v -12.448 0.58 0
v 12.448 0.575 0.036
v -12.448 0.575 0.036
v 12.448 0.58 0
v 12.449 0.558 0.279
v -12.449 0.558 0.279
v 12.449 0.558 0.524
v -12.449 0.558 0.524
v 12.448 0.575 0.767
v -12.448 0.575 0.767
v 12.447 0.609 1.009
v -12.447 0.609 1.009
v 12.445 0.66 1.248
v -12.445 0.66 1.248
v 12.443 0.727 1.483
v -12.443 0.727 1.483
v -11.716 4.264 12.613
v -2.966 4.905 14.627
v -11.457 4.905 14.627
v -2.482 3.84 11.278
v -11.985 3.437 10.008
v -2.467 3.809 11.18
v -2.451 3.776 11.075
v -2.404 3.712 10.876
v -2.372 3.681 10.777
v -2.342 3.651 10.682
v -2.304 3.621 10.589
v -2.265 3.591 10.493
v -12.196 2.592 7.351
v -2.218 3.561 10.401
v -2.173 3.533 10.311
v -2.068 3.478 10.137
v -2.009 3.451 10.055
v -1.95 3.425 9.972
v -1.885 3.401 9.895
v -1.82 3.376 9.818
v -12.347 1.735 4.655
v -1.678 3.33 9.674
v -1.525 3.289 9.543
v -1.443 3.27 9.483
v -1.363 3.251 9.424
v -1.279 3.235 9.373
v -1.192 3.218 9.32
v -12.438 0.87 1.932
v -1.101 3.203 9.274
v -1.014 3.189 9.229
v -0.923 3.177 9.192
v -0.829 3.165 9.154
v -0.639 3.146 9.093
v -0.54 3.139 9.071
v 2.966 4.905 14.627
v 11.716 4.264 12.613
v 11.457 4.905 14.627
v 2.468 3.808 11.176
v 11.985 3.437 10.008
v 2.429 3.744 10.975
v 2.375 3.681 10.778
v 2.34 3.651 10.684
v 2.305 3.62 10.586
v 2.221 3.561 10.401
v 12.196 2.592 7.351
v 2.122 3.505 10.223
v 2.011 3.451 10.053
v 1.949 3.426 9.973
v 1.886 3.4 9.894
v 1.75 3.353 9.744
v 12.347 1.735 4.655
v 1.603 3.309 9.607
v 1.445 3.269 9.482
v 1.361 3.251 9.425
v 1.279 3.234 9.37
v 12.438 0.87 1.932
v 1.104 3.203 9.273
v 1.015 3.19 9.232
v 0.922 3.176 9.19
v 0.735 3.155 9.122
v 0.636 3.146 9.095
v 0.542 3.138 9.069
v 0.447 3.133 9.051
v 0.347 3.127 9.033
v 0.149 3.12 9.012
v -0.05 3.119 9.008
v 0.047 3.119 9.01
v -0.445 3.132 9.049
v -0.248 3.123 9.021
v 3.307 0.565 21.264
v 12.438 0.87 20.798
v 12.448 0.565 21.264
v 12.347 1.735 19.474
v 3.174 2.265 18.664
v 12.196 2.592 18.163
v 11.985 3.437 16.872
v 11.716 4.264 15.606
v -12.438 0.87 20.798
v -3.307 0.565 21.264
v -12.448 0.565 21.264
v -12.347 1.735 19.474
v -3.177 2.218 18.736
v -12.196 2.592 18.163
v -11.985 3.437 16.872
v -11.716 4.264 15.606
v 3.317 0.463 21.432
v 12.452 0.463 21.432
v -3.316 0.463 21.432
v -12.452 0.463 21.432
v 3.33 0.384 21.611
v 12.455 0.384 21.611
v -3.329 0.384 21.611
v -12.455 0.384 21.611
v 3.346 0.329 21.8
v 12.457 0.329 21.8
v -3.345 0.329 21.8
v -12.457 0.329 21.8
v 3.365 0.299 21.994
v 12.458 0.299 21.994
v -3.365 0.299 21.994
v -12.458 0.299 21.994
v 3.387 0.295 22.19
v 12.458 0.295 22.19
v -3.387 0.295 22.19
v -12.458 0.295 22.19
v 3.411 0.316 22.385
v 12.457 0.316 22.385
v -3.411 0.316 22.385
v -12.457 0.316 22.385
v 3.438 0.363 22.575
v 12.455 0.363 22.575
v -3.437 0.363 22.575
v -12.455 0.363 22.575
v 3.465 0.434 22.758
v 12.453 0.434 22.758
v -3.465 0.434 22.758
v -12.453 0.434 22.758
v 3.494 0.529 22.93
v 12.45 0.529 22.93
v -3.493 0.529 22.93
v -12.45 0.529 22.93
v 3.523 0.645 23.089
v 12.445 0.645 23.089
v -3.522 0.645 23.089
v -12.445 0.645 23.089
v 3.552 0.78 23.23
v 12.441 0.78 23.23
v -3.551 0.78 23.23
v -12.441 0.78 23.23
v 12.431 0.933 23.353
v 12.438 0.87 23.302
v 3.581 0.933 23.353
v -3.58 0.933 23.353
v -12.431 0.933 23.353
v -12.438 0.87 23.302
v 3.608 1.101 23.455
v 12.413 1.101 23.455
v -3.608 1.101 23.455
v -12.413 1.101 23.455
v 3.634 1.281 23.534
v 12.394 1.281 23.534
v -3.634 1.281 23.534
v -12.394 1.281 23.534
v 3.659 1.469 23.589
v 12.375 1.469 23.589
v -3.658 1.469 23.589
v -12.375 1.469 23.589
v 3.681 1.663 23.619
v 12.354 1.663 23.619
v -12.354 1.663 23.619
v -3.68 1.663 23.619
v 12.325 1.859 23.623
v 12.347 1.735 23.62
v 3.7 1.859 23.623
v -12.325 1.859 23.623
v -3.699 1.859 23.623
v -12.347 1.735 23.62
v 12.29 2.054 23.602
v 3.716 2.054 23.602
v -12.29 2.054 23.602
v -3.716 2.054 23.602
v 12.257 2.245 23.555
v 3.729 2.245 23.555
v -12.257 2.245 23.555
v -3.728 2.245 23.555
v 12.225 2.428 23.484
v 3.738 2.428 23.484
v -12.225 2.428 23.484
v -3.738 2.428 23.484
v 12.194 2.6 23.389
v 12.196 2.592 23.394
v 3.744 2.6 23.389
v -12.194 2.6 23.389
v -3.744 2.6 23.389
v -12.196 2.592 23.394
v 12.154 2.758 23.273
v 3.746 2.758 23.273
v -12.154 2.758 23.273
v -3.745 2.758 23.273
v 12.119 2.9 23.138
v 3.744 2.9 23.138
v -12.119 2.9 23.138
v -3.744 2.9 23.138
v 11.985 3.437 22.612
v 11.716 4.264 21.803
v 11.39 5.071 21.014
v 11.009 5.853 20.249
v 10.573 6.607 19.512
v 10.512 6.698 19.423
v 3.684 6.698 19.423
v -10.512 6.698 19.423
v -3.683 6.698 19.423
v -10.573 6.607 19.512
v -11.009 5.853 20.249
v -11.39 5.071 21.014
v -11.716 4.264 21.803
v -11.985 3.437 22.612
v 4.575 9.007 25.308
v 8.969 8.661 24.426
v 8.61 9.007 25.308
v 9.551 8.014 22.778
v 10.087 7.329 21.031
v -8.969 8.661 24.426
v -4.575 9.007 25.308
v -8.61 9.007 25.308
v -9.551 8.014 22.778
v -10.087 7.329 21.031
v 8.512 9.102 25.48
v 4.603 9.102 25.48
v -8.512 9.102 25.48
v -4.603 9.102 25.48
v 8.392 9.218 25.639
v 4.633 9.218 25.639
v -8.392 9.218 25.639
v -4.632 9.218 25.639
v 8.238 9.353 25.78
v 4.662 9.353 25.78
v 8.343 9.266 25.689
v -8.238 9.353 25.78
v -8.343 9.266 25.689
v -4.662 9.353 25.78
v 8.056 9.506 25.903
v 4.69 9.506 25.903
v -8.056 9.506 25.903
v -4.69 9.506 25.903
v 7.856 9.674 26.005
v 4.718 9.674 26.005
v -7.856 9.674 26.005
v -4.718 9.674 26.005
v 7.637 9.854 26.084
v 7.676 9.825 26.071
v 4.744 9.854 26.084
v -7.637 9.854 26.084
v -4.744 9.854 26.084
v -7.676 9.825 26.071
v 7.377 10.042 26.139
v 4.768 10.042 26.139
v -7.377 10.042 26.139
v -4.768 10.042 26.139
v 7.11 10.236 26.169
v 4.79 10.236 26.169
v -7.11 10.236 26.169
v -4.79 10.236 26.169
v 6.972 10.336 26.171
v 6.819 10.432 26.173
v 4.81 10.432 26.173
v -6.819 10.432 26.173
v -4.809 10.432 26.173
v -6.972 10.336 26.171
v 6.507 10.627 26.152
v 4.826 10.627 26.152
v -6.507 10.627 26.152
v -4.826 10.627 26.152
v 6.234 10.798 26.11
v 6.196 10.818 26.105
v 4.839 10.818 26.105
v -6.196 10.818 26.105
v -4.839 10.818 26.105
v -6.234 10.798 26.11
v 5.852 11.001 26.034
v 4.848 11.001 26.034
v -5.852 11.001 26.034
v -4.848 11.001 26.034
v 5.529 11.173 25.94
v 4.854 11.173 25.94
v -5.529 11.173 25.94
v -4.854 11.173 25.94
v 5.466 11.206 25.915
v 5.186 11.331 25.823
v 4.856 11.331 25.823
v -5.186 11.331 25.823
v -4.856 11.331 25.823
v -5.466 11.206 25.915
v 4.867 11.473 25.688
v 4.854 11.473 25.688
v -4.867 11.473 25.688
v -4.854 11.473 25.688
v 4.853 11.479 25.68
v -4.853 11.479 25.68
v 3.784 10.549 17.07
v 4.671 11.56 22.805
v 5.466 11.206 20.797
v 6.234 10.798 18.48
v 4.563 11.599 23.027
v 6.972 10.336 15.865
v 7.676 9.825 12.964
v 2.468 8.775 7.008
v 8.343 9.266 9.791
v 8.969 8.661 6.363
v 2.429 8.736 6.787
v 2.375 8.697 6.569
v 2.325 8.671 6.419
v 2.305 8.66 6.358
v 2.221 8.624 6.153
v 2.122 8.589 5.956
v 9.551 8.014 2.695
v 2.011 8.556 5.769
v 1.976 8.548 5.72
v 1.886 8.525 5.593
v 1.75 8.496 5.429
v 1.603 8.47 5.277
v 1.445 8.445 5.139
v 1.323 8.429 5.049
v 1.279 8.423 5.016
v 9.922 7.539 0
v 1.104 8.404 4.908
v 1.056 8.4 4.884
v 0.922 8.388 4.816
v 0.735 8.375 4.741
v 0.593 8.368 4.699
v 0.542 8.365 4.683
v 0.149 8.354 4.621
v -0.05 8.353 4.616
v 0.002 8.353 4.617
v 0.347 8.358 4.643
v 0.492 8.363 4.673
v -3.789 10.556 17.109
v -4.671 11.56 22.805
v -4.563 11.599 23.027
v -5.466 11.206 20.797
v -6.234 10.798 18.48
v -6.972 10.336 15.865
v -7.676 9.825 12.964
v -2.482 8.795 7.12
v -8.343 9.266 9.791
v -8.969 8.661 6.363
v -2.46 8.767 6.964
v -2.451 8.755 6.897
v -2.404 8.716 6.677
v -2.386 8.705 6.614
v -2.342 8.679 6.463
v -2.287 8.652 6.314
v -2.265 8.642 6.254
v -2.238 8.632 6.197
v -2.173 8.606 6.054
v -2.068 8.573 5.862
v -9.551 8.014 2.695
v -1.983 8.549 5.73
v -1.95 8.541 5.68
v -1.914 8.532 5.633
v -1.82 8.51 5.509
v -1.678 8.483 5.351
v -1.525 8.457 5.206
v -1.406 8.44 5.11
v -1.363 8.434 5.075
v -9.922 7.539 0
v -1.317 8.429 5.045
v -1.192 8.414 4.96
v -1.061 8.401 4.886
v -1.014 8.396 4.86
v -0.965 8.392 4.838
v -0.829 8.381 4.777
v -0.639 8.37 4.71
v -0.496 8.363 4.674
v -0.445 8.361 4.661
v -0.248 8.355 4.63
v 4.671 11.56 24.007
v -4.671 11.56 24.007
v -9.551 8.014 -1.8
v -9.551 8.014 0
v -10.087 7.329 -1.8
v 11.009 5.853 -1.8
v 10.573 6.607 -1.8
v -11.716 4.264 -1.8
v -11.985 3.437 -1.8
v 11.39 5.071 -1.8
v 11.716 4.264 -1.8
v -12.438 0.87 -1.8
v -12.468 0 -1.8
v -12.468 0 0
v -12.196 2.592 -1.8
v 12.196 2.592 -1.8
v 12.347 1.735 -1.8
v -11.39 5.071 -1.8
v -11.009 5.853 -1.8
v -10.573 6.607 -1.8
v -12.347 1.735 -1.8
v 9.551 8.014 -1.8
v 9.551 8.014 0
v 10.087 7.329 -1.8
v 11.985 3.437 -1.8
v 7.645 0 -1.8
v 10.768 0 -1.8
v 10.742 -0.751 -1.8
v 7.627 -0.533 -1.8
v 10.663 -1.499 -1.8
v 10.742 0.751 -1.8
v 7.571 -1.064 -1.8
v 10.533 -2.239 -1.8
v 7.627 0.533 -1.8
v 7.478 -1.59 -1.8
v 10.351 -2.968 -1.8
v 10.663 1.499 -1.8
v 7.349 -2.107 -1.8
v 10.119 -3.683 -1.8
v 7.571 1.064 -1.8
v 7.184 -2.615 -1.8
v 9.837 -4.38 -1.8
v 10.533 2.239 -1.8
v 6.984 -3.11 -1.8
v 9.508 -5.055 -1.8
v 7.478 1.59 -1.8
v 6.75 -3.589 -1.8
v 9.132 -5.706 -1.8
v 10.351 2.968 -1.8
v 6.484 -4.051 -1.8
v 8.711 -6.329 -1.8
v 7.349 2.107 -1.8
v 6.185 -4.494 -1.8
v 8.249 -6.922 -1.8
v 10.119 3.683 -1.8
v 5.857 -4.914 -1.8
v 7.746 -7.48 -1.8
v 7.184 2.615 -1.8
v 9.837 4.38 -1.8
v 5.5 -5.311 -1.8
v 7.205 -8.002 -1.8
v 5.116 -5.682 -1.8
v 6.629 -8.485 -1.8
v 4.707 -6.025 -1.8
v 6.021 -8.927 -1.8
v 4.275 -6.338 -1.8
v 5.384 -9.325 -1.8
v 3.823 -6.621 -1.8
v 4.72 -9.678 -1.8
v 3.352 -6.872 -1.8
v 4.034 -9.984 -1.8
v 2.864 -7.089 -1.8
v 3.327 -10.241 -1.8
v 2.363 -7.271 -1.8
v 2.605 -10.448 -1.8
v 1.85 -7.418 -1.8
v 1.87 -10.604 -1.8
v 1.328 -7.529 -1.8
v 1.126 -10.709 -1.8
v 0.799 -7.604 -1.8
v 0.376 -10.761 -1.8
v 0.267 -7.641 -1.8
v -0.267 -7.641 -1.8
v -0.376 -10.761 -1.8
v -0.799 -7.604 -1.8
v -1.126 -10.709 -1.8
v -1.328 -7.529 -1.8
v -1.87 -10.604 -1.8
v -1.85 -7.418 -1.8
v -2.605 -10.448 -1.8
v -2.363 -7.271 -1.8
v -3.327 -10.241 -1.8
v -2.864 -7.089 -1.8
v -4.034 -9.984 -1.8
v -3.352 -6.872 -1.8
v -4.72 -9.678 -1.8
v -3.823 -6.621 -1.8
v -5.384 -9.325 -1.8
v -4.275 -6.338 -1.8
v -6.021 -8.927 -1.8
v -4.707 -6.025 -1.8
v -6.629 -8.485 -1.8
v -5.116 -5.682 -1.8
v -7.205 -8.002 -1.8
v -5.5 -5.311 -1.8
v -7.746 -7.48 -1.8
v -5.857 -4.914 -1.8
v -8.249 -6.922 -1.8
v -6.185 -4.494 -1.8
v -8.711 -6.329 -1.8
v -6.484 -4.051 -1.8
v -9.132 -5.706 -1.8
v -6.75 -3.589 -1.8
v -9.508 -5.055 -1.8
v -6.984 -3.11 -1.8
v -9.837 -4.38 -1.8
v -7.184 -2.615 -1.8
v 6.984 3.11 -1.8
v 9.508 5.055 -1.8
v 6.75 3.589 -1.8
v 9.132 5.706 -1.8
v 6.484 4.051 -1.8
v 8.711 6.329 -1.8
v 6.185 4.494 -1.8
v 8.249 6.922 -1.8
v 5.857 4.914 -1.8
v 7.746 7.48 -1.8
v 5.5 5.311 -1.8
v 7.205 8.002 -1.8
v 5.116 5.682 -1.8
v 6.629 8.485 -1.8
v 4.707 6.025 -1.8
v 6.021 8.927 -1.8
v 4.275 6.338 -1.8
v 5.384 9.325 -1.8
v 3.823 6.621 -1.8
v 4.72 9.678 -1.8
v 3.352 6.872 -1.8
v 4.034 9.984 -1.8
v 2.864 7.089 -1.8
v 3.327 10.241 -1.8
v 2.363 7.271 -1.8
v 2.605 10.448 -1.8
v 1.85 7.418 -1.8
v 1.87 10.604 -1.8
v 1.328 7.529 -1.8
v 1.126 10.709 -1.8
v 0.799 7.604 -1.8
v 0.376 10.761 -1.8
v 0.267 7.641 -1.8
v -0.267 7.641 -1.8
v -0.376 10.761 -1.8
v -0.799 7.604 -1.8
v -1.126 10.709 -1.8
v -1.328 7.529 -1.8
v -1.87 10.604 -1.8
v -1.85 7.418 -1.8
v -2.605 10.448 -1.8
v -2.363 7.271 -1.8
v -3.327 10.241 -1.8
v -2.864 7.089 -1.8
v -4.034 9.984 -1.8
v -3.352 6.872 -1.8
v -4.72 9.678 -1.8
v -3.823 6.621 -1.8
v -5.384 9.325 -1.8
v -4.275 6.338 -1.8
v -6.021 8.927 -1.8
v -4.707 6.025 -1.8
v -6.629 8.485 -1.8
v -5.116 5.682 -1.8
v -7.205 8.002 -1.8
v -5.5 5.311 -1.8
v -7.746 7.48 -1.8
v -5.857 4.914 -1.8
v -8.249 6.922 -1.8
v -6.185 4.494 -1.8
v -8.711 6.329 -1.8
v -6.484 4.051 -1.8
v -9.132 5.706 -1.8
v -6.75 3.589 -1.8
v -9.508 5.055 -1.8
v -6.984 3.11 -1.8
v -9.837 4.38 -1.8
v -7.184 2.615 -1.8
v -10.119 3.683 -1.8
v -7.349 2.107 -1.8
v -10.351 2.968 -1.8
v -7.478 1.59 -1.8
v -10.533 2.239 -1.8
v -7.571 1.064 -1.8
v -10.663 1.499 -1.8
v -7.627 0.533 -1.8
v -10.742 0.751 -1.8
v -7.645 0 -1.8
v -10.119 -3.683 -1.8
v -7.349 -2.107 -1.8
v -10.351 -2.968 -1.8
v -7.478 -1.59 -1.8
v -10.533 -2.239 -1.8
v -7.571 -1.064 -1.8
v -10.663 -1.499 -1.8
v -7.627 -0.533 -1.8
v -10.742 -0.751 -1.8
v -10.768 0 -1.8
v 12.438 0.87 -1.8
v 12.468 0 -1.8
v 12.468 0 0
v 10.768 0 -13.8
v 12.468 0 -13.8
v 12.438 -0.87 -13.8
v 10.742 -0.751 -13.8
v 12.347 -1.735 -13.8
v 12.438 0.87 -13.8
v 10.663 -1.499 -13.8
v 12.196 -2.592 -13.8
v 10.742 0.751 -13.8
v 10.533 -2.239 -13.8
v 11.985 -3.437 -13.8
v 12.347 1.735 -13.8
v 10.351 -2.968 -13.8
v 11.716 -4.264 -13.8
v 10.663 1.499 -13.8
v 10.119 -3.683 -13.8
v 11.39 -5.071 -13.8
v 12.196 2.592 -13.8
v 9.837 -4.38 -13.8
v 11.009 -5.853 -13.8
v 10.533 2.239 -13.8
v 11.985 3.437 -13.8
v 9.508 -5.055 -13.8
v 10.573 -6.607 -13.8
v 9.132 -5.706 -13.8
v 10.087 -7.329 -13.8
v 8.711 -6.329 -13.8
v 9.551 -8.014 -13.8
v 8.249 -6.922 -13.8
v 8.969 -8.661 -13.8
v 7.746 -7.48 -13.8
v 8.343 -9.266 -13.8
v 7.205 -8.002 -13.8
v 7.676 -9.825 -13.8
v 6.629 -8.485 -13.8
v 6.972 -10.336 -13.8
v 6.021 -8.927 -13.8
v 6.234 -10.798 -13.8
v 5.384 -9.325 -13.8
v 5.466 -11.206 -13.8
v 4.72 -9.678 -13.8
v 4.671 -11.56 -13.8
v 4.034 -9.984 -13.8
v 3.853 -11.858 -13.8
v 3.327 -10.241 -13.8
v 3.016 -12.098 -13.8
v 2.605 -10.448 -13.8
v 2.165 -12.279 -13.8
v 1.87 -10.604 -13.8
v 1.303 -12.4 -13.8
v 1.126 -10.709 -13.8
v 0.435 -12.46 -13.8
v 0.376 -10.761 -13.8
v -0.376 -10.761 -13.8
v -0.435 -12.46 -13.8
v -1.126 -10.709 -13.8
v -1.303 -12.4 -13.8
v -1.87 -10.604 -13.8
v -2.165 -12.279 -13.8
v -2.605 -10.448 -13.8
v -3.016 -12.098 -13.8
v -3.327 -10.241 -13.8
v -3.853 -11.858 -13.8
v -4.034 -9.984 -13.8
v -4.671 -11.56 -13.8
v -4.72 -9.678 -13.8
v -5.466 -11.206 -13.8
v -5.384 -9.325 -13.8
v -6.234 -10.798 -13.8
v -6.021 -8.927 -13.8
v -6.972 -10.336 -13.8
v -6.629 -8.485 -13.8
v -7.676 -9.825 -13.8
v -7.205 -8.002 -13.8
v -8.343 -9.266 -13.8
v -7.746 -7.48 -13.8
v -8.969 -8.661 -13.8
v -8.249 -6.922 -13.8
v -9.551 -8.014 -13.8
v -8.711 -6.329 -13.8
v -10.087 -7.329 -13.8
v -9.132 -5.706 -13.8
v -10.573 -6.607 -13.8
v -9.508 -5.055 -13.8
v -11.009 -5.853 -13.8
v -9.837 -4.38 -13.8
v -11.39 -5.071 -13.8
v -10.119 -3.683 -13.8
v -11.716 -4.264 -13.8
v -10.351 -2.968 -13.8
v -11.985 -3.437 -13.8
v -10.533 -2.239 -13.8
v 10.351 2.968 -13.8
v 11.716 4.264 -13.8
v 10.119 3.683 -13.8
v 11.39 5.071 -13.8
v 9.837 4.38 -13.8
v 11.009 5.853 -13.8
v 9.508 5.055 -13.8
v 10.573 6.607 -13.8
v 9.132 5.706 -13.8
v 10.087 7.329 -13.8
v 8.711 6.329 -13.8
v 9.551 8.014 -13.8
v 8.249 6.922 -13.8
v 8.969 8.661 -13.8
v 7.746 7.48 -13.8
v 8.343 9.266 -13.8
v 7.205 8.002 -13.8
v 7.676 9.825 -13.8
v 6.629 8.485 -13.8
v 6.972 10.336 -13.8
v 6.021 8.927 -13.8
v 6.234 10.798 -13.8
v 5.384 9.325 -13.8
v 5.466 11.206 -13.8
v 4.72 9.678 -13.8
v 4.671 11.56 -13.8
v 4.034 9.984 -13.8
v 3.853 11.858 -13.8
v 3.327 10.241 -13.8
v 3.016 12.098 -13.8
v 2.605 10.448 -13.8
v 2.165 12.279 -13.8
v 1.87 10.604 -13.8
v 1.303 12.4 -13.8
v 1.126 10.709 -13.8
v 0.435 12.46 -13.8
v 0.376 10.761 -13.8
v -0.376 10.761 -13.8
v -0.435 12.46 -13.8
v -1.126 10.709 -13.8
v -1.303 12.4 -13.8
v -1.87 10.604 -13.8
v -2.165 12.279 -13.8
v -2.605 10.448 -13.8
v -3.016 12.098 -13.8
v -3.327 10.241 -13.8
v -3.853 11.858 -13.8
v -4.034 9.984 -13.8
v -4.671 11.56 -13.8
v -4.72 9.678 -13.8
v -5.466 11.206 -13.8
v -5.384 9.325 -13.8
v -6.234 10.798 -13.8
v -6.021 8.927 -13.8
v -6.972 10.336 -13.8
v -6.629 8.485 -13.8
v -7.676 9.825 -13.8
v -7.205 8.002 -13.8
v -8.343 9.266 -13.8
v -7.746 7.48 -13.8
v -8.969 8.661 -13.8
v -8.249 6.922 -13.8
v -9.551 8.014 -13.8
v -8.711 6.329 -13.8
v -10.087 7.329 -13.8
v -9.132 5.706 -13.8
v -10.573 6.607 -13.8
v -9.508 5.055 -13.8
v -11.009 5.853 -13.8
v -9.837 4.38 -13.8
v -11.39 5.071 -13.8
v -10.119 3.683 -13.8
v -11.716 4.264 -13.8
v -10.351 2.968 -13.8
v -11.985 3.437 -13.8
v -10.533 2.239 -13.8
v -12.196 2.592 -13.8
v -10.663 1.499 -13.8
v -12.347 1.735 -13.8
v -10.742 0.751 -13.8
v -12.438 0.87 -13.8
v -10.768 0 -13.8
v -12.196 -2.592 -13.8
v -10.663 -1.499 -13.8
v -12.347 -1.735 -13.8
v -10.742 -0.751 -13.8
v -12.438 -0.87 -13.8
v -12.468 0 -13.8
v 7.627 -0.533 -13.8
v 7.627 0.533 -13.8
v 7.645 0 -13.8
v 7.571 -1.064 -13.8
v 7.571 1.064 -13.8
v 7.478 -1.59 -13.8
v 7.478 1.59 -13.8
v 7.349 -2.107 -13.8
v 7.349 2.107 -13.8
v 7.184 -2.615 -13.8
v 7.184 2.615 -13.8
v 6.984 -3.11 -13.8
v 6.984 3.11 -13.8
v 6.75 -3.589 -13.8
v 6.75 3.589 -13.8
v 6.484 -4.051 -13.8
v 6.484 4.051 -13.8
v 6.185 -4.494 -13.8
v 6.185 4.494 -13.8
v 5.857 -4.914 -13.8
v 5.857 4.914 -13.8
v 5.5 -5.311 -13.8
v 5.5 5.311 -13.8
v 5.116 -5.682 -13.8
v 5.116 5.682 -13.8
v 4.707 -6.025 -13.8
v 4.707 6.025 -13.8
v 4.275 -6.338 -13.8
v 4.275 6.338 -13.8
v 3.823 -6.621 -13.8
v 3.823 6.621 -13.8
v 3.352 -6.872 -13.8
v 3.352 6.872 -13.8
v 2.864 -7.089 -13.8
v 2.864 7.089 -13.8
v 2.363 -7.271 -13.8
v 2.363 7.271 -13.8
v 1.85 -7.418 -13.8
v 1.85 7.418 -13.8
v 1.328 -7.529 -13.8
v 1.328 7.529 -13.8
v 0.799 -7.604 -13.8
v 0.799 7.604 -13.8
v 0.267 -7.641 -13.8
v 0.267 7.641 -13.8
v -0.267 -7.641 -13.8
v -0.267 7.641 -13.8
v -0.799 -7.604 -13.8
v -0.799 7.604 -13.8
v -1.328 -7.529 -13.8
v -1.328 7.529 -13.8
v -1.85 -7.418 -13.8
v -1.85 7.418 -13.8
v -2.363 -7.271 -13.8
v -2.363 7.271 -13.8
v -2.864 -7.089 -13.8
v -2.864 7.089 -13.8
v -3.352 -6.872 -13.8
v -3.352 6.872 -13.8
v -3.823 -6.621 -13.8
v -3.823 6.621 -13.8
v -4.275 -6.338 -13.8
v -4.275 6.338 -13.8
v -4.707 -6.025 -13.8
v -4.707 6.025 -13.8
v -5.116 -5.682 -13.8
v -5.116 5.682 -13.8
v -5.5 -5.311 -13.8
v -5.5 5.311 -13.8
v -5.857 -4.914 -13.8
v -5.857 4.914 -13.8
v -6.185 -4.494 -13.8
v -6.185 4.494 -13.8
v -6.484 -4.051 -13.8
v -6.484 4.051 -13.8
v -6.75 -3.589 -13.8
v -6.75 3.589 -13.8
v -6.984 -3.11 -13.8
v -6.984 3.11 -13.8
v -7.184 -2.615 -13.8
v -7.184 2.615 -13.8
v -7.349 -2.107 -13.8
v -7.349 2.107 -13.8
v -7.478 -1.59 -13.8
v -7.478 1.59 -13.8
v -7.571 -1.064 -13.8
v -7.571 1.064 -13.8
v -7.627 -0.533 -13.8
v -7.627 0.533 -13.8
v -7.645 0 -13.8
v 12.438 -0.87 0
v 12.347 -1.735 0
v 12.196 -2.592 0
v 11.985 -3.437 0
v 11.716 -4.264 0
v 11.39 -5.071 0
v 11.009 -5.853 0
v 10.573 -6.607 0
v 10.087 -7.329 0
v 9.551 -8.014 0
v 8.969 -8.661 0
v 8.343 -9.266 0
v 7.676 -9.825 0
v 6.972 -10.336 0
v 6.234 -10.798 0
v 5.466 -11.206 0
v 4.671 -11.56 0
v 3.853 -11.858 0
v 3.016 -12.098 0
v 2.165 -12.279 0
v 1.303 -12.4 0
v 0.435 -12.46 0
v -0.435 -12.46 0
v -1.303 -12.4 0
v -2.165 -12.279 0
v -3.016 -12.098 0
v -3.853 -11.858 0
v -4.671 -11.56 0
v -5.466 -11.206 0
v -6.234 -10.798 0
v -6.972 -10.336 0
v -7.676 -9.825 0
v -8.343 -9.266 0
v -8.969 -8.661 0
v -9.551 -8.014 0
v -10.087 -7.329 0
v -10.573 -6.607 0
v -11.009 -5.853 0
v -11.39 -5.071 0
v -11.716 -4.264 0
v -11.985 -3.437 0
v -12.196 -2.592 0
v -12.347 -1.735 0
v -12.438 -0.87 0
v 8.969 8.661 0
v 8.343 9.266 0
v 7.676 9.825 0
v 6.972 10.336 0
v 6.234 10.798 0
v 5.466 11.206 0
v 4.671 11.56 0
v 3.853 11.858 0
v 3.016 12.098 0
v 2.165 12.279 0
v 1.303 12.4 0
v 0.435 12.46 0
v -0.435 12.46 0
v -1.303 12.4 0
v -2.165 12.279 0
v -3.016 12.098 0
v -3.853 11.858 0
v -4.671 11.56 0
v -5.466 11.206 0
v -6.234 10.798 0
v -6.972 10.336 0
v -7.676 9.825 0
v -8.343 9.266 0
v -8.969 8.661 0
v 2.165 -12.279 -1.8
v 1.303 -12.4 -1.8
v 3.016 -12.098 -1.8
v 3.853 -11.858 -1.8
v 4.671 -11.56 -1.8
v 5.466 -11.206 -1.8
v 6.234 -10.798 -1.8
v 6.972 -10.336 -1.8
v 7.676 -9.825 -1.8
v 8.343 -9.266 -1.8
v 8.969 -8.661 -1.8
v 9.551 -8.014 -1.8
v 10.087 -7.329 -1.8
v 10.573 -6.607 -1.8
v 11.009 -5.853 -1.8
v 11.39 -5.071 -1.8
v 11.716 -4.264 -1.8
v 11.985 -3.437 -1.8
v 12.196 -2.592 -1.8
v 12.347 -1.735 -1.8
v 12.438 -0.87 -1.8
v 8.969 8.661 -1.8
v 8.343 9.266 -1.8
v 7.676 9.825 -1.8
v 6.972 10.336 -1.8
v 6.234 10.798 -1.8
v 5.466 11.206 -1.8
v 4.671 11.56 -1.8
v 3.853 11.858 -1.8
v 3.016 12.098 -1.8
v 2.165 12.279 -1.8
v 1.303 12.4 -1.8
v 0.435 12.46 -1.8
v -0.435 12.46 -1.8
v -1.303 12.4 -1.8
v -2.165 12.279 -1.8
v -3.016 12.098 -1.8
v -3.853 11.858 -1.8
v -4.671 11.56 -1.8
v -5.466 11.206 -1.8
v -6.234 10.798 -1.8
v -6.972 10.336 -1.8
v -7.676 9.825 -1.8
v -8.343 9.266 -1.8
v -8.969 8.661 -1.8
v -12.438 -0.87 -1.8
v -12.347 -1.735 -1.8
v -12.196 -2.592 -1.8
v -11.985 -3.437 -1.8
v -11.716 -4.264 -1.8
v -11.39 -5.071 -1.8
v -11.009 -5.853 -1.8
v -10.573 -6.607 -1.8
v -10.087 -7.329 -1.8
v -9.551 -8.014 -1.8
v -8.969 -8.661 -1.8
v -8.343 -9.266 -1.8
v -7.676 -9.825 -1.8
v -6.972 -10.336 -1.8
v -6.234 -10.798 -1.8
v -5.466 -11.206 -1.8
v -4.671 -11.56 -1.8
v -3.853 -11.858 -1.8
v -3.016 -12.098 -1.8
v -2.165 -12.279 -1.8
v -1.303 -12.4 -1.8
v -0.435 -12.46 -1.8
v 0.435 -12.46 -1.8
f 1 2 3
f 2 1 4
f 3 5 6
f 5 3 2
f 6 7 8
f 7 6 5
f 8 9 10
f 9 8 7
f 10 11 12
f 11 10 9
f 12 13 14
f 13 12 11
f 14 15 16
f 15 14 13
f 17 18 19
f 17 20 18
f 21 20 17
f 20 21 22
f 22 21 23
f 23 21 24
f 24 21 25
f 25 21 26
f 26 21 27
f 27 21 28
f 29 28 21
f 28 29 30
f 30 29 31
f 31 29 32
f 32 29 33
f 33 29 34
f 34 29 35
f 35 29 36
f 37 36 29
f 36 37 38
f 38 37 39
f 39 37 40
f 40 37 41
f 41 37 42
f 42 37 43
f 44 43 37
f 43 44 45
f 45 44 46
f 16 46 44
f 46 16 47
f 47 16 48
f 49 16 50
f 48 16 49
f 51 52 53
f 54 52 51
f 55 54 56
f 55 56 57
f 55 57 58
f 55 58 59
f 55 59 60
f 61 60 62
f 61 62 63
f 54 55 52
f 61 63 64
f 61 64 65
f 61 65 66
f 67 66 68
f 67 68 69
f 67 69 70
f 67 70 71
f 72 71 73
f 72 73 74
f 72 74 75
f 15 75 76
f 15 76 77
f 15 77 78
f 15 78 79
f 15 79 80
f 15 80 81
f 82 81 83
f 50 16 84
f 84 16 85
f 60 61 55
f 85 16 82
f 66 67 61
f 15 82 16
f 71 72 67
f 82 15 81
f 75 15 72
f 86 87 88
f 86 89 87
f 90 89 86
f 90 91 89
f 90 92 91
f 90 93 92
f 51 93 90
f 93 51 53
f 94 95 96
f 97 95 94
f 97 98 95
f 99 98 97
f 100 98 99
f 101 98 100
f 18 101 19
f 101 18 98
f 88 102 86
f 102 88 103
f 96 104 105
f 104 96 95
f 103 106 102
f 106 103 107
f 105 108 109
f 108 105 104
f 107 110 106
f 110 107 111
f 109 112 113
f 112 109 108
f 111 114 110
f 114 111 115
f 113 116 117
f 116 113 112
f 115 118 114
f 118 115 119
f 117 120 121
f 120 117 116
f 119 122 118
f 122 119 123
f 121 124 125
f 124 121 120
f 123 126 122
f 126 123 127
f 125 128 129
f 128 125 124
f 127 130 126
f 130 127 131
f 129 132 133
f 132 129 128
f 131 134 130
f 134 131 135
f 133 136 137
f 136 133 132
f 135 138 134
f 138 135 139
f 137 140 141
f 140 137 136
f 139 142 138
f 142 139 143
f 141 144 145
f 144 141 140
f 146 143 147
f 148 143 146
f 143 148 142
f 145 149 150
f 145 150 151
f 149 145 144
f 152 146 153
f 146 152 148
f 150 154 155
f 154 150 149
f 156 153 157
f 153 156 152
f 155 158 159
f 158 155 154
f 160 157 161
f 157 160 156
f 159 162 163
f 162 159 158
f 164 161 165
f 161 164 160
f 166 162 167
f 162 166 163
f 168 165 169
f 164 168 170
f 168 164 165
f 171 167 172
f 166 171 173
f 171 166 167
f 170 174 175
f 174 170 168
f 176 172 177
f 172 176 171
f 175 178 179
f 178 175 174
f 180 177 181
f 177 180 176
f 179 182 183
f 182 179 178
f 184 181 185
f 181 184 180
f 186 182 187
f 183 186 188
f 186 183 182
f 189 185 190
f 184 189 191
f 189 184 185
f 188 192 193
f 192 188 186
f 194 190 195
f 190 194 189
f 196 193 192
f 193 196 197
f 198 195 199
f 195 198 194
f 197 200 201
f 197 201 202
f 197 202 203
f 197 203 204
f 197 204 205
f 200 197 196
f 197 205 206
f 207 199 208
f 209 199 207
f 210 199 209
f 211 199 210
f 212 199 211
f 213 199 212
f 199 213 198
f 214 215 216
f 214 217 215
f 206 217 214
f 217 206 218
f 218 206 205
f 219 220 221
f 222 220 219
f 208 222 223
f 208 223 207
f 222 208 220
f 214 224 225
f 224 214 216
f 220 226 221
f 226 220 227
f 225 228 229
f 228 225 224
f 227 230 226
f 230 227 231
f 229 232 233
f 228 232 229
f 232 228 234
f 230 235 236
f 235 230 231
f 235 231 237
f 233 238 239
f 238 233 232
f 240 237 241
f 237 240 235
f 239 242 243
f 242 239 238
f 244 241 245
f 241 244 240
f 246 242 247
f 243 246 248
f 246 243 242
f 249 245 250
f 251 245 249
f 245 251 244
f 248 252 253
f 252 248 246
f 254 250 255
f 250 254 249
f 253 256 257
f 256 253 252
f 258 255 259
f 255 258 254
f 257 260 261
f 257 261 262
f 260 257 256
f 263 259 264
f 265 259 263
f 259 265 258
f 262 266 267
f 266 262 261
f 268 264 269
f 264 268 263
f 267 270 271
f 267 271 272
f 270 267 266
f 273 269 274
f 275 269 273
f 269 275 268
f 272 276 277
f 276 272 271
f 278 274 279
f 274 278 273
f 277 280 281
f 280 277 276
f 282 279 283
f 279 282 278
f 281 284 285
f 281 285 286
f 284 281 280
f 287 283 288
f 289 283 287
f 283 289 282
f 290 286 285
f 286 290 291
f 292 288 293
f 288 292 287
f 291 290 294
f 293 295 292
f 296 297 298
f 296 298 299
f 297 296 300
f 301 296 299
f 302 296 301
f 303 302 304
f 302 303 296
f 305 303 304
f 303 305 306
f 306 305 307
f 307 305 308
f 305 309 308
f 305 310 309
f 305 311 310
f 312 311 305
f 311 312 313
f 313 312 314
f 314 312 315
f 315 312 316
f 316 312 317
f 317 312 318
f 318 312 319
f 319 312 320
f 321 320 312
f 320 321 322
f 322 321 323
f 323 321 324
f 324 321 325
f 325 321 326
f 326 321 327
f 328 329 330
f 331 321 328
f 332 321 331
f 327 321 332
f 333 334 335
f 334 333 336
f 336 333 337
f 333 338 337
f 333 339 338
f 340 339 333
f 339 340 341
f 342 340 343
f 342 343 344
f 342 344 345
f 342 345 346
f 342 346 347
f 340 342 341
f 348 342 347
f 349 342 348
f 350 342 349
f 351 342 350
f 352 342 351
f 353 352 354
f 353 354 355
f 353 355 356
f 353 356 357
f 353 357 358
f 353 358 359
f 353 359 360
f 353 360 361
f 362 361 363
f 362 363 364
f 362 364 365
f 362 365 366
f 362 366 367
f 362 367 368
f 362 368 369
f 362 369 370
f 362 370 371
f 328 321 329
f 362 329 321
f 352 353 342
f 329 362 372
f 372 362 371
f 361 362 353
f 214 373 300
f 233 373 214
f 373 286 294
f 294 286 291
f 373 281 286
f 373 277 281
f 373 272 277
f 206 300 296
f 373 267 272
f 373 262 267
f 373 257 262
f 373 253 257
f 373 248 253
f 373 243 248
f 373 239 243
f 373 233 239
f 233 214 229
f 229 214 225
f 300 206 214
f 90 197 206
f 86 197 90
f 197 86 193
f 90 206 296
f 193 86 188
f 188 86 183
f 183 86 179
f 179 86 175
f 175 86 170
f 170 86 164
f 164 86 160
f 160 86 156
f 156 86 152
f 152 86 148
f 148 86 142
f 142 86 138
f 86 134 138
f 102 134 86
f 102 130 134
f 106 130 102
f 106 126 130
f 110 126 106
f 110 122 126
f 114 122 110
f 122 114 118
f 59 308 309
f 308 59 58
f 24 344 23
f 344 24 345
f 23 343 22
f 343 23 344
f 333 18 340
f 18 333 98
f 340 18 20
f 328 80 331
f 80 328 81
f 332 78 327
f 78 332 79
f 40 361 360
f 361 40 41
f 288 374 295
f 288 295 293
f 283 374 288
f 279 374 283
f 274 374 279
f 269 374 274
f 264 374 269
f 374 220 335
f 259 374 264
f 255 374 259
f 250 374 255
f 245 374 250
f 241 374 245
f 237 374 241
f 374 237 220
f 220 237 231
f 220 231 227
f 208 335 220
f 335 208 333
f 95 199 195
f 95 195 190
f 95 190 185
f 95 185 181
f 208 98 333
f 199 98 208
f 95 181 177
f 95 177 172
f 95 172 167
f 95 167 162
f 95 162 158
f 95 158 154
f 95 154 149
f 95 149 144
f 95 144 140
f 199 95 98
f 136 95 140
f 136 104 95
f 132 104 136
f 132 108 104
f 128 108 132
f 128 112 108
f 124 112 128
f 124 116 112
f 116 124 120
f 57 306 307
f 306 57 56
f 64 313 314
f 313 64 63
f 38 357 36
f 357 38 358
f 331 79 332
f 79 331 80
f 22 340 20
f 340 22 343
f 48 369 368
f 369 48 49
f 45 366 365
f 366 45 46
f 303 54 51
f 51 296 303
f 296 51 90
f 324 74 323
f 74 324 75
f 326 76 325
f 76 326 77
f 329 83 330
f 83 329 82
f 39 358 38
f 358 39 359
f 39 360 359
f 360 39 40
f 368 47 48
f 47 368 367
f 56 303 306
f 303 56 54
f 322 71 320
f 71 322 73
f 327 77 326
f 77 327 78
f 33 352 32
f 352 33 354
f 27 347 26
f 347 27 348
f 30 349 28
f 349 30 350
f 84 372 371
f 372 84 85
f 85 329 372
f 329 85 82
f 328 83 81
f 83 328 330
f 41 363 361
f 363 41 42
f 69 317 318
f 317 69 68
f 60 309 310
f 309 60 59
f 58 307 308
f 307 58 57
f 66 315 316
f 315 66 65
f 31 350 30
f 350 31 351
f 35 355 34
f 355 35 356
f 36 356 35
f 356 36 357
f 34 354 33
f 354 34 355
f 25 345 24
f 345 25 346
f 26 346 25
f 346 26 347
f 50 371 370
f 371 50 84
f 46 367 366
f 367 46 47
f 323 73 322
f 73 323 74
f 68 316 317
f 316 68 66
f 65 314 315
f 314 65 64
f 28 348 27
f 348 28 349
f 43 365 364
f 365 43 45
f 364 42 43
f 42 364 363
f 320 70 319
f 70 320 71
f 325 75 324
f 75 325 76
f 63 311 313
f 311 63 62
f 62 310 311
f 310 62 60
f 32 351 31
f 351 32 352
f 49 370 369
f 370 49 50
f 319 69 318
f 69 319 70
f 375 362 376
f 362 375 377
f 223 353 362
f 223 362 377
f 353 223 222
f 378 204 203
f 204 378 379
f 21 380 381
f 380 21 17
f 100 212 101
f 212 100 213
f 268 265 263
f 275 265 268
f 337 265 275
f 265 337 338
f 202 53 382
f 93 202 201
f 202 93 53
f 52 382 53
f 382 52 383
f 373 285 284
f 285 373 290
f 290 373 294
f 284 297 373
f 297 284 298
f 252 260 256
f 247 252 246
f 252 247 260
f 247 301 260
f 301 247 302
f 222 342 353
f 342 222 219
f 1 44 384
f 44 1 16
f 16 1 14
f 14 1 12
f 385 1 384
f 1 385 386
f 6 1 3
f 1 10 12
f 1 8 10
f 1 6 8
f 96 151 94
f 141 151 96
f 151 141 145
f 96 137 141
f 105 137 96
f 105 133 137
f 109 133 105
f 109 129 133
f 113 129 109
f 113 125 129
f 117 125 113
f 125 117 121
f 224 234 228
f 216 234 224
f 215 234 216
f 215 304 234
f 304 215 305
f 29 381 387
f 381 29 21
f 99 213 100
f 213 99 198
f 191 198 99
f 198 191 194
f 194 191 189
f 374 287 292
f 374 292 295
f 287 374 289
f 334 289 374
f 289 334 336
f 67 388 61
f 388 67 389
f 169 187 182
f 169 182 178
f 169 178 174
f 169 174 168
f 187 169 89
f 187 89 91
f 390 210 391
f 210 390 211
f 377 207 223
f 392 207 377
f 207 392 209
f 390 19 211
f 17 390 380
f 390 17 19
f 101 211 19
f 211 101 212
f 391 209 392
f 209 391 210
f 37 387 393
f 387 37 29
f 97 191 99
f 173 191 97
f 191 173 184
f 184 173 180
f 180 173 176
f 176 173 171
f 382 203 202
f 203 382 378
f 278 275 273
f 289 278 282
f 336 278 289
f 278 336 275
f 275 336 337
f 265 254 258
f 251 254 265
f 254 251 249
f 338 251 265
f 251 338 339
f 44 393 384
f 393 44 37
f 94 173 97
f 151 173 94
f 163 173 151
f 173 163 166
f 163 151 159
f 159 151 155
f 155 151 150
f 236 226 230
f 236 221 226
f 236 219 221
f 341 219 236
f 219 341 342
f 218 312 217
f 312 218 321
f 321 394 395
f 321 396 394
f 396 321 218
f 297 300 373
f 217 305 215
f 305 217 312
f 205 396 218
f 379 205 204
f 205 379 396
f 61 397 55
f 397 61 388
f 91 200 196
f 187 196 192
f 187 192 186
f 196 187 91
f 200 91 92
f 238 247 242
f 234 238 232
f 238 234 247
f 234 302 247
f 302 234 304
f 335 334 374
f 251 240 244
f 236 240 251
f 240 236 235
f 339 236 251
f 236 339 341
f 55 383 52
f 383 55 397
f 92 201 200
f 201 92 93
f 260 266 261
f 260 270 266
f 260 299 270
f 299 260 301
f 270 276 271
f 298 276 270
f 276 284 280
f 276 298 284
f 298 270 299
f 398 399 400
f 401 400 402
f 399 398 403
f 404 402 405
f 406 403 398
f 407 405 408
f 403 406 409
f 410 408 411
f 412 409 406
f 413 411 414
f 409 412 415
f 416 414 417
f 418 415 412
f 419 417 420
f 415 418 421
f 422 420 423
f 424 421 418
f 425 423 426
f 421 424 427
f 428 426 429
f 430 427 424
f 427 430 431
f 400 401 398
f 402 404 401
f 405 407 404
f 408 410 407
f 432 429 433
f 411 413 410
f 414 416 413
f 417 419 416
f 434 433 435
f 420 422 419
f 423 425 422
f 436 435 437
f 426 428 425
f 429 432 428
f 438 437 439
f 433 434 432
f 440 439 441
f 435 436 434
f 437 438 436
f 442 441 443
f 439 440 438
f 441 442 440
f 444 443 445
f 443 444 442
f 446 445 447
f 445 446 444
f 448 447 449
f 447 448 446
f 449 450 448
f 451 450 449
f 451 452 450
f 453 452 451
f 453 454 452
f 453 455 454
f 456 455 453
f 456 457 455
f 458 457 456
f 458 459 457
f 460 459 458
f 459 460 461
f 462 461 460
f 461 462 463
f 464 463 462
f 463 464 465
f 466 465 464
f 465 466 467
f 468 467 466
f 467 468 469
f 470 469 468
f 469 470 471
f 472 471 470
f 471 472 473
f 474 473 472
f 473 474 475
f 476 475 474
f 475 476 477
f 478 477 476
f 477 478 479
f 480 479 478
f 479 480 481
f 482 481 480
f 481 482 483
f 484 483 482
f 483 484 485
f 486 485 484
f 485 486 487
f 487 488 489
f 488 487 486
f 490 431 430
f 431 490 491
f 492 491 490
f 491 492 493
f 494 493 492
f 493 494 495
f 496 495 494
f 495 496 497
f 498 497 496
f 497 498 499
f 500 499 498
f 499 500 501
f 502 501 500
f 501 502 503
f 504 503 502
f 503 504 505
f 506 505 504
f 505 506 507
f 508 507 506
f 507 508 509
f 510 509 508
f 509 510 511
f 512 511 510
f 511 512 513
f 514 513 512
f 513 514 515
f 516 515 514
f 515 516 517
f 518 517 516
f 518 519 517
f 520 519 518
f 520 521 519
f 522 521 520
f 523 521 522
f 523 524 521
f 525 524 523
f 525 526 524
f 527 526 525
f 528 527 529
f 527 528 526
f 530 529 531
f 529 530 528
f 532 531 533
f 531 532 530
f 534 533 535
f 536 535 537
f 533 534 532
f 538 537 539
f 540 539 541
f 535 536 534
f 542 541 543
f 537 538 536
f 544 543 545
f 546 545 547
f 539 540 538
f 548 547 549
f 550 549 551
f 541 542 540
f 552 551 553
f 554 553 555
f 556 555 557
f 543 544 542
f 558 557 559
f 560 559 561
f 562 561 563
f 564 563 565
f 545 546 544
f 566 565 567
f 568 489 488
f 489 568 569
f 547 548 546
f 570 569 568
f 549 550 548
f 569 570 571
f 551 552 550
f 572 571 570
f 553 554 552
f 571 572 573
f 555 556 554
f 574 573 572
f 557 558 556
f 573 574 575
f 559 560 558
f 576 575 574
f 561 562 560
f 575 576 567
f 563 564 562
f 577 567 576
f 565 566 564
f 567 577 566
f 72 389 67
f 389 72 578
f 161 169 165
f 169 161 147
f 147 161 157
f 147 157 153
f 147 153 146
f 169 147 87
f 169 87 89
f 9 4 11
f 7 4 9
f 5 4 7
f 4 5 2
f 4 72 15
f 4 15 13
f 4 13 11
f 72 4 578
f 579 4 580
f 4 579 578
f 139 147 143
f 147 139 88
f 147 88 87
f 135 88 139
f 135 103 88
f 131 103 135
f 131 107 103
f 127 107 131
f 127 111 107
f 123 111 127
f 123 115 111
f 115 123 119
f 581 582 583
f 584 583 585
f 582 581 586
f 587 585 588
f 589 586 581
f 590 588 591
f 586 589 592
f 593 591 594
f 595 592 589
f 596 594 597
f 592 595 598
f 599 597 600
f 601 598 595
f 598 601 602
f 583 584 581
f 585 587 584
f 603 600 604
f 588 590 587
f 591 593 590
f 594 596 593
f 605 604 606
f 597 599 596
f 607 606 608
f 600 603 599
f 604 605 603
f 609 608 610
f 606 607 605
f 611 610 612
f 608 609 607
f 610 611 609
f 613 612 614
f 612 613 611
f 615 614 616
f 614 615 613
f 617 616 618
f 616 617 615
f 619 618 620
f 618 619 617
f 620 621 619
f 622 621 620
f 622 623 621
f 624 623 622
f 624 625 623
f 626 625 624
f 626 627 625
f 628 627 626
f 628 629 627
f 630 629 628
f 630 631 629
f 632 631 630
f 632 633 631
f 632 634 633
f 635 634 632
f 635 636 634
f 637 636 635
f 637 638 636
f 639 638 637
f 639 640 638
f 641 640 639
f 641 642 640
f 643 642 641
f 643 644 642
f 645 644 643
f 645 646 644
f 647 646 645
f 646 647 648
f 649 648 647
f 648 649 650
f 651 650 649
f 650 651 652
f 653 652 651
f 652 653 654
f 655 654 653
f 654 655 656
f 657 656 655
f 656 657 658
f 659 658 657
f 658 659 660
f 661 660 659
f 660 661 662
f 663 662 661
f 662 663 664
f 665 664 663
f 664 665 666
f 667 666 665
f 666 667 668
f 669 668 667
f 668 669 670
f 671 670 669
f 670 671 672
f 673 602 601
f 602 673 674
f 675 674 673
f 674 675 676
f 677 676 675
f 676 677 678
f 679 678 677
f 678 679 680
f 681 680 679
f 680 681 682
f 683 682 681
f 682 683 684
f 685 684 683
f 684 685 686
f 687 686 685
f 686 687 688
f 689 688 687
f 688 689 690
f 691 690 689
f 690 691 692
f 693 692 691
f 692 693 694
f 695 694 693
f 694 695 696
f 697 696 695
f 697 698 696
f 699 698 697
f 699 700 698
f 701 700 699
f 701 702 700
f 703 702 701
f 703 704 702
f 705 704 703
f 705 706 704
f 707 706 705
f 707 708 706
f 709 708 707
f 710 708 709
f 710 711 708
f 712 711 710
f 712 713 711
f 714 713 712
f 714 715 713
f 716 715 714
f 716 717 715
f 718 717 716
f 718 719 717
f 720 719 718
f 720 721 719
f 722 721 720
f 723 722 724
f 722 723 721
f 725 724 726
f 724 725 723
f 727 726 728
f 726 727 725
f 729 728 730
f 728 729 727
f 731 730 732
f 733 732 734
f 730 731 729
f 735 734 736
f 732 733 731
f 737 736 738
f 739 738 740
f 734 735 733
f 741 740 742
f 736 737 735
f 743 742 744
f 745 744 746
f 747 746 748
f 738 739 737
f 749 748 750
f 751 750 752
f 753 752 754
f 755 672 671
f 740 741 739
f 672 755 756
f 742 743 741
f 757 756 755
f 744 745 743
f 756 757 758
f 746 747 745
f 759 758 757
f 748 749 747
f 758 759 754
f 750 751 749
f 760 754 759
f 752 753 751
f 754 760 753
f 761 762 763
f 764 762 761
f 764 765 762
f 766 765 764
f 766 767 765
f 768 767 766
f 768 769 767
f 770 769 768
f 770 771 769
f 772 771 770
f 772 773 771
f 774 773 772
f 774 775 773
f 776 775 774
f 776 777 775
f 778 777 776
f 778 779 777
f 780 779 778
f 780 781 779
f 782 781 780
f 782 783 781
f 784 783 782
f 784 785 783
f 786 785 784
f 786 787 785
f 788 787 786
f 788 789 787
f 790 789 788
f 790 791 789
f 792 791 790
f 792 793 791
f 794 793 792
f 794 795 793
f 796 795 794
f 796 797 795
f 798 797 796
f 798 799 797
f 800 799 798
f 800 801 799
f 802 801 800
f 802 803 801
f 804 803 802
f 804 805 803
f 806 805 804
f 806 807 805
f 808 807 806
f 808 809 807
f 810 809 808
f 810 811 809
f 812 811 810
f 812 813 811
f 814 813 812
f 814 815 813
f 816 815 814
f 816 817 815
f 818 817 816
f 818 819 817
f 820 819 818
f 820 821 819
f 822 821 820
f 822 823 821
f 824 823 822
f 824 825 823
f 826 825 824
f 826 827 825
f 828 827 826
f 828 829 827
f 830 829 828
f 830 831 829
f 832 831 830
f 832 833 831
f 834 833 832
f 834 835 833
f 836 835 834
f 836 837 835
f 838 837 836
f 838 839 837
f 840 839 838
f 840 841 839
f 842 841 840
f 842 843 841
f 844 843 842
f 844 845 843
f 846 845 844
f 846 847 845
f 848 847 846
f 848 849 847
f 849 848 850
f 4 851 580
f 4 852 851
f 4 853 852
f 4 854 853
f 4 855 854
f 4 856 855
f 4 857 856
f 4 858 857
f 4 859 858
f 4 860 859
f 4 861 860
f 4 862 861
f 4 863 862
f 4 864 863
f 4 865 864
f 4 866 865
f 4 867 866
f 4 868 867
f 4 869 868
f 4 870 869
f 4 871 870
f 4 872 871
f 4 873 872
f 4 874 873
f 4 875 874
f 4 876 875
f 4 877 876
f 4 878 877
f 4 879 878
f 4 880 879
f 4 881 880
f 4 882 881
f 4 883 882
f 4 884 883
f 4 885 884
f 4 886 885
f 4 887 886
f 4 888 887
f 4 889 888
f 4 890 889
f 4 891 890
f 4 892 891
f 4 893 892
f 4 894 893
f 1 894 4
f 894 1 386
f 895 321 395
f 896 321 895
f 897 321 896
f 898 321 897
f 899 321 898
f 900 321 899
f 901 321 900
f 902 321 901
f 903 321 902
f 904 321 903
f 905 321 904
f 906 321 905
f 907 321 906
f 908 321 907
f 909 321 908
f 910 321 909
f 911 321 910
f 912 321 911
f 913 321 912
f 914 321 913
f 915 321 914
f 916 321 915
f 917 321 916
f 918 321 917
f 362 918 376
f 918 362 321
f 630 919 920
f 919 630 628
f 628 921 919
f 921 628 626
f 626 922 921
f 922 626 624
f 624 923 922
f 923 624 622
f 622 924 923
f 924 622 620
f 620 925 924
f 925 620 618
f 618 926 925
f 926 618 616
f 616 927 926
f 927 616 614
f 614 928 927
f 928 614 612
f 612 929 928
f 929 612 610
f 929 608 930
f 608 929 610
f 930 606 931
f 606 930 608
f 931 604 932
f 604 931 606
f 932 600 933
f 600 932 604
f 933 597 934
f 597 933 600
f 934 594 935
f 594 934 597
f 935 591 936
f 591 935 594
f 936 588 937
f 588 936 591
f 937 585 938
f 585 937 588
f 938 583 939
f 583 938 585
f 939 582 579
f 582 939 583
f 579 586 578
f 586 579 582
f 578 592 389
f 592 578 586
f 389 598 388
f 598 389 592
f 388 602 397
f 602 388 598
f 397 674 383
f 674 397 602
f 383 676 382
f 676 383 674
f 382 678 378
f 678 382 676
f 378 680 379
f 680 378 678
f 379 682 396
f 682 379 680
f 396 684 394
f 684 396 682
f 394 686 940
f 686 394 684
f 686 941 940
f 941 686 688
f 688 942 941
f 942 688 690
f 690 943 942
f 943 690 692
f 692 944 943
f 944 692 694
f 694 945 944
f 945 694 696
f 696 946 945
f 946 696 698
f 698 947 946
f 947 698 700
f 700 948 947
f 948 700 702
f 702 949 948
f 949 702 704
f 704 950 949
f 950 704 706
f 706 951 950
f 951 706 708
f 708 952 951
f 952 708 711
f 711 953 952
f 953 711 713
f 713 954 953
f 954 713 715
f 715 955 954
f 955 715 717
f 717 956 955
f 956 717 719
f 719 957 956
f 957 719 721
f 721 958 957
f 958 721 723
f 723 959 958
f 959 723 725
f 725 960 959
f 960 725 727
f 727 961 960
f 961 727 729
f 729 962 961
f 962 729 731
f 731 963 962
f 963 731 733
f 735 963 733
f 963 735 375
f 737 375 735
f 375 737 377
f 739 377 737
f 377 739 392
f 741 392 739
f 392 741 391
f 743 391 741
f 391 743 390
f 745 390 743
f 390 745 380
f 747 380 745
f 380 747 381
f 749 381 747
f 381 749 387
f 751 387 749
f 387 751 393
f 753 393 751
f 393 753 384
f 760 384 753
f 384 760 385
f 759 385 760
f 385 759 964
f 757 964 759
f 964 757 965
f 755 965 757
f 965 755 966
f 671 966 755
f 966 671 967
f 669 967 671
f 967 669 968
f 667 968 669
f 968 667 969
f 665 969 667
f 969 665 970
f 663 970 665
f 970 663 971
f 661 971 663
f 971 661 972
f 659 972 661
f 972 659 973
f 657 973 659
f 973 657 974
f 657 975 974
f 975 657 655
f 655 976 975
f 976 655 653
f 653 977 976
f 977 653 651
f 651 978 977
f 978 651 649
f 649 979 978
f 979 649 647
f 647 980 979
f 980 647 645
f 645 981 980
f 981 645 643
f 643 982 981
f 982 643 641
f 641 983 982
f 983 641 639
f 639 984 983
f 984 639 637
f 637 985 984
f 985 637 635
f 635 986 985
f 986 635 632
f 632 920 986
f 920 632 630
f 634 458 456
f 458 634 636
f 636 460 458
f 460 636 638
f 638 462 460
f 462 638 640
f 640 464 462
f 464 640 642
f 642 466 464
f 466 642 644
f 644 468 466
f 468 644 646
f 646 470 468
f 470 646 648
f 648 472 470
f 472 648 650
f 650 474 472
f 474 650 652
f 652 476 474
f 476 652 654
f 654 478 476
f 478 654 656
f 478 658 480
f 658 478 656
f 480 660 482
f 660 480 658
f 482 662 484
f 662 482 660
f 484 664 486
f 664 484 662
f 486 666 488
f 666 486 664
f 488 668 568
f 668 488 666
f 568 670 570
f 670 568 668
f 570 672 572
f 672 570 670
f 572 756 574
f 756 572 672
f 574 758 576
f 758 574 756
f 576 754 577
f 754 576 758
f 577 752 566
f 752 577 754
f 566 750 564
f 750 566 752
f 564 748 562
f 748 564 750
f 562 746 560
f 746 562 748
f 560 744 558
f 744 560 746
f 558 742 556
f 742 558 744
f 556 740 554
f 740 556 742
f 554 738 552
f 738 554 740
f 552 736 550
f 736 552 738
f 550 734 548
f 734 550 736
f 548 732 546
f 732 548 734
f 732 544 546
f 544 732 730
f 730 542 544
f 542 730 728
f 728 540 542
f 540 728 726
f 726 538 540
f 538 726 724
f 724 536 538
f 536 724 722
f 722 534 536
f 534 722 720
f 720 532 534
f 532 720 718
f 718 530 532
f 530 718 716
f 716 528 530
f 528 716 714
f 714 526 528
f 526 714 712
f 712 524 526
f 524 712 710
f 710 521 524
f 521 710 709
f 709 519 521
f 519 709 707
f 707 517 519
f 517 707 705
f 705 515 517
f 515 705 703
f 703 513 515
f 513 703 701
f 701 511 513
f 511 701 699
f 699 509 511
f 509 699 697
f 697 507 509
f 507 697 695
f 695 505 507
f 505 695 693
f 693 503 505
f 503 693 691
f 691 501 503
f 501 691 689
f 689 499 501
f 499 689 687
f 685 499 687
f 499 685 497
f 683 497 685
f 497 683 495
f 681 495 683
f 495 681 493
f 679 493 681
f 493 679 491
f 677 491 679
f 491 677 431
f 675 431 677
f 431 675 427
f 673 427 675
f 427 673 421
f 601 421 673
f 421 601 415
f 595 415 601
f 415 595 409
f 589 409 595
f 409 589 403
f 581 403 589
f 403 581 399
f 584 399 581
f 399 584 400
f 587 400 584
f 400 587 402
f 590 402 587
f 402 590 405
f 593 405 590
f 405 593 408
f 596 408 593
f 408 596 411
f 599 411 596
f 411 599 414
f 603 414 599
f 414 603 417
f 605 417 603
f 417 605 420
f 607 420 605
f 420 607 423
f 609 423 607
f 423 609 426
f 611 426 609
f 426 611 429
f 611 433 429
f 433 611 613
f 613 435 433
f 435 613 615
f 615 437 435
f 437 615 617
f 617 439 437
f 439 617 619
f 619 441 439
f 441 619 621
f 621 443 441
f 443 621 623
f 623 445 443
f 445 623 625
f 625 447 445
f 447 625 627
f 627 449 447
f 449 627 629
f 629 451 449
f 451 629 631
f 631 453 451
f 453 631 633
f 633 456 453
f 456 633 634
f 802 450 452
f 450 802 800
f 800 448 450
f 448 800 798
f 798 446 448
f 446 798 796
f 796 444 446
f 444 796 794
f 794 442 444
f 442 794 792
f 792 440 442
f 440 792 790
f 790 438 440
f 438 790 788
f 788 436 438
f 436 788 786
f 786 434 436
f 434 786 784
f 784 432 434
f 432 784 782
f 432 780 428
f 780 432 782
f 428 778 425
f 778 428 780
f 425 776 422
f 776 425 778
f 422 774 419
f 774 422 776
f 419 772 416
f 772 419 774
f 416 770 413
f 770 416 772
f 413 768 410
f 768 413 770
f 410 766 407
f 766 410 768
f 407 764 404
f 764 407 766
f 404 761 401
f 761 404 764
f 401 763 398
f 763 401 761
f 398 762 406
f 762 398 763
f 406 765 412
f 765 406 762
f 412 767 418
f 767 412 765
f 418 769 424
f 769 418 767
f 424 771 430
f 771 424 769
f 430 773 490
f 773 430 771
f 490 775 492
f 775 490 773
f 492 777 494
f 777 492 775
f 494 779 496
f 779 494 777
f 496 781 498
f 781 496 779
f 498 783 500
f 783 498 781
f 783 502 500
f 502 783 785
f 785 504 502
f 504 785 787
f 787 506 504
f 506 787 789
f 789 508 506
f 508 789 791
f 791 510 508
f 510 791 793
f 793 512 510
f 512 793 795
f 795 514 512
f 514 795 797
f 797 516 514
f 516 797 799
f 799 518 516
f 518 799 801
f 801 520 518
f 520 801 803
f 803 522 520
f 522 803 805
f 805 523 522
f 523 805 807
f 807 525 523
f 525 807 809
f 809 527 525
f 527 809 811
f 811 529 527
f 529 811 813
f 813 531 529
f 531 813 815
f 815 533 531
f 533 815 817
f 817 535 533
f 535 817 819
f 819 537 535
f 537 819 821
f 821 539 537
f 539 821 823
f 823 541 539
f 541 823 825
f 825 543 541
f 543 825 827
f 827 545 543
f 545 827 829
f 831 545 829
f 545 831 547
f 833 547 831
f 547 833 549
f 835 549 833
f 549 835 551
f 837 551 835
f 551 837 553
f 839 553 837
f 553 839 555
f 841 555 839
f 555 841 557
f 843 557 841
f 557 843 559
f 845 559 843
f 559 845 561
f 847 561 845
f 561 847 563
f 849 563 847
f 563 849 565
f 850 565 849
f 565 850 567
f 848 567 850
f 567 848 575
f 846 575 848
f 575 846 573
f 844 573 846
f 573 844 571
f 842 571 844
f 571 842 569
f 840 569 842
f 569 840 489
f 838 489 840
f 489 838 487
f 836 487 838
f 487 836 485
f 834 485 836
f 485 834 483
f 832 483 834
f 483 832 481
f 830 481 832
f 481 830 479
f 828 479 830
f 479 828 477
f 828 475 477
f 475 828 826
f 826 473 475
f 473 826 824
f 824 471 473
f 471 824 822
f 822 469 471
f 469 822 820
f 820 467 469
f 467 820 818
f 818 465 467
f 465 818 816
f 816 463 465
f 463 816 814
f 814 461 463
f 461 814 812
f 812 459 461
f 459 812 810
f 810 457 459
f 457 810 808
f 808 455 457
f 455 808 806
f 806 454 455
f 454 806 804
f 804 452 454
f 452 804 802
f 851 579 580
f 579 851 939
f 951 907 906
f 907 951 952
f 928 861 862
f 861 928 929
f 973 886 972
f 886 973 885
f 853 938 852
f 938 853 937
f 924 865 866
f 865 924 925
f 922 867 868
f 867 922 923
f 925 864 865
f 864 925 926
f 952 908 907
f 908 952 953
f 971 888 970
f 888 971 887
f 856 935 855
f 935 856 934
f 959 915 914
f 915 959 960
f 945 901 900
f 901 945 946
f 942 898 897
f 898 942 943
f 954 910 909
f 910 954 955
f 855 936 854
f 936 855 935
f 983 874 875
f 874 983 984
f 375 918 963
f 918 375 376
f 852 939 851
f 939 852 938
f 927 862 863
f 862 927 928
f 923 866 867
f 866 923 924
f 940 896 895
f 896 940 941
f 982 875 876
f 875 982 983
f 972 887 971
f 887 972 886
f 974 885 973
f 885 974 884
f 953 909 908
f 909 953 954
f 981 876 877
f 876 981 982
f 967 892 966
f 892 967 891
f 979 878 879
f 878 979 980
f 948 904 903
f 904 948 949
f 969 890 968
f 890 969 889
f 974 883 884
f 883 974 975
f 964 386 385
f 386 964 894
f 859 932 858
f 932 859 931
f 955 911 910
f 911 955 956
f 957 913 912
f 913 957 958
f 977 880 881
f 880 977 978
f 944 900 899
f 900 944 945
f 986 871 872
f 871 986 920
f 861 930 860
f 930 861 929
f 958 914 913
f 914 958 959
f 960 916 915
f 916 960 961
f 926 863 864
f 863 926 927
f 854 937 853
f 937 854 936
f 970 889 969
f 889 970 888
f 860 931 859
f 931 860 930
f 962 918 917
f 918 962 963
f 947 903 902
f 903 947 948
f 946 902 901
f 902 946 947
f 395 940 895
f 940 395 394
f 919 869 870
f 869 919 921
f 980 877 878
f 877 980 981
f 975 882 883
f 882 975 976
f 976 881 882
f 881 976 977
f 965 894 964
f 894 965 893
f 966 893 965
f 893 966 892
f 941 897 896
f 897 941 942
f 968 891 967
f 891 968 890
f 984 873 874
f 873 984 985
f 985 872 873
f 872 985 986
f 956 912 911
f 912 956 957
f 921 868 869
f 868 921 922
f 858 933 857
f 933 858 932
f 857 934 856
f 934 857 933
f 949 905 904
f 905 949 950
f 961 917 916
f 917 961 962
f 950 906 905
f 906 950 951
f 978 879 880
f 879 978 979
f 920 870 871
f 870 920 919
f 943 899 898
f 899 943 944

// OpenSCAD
// A tool for hanging Christmas lights.
// Attach this to the end of a 1/2" PVC pipe.

function inch(x) = 25.4 * x;

pipe_id = inch(0.602);
pipe_od = inch(0.840);

nozzle_d = 0.4;

$fs = nozzle_d/2;
$fa = 4;

wall_th = 1.8;
plug_h = 12 + wall_th;
plug_od = pipe_od + 2*wall_th;
base_h = 5;
fork_offset = 15;

translate([0, 0, -plug_h]) {
    linear_extrude(plug_h) {
        difference() {
            circle(d=plug_od);
            circle(d=pipe_od + nozzle_d/2);
        }
        circle(d = pipe_id);
    }
}
translate([0, 0, -wall_th]) {
    linear_extrude(wall_th) {
        circle(d=plug_od);
    }
}

intersection() {
    translate([0, 0, -wall_th]) linear_extrude(100) circle(d=plug_od);
    translate([0, pipe_id/2, fork_offset]) {
        rotate([80, 0, 0]) {
            difference() {
                rotate([0, -90, 0]) {
                    linear_extrude(25, center=true, convexity=8) {
                        hull() {
                            translate([-1, 10]) circle(d=3);
                            circle(d=5);
                            translate([1, -15]) circle(d=7);
                        }
                        hull() {
                            circle(d=5);
                            translate([7, 6]) circle(d=3);
                        }
                    }
                }
                rotate([-30, 0, 0]) {
                    linear_extrude(30, center=true, convexity=8) {
                        hull() {
                            translate([0, -5]) circle(d=5);
                            translate([0, 12]) circle(d=10);
                        }
                    }
                }
            }
        }
    }
}
